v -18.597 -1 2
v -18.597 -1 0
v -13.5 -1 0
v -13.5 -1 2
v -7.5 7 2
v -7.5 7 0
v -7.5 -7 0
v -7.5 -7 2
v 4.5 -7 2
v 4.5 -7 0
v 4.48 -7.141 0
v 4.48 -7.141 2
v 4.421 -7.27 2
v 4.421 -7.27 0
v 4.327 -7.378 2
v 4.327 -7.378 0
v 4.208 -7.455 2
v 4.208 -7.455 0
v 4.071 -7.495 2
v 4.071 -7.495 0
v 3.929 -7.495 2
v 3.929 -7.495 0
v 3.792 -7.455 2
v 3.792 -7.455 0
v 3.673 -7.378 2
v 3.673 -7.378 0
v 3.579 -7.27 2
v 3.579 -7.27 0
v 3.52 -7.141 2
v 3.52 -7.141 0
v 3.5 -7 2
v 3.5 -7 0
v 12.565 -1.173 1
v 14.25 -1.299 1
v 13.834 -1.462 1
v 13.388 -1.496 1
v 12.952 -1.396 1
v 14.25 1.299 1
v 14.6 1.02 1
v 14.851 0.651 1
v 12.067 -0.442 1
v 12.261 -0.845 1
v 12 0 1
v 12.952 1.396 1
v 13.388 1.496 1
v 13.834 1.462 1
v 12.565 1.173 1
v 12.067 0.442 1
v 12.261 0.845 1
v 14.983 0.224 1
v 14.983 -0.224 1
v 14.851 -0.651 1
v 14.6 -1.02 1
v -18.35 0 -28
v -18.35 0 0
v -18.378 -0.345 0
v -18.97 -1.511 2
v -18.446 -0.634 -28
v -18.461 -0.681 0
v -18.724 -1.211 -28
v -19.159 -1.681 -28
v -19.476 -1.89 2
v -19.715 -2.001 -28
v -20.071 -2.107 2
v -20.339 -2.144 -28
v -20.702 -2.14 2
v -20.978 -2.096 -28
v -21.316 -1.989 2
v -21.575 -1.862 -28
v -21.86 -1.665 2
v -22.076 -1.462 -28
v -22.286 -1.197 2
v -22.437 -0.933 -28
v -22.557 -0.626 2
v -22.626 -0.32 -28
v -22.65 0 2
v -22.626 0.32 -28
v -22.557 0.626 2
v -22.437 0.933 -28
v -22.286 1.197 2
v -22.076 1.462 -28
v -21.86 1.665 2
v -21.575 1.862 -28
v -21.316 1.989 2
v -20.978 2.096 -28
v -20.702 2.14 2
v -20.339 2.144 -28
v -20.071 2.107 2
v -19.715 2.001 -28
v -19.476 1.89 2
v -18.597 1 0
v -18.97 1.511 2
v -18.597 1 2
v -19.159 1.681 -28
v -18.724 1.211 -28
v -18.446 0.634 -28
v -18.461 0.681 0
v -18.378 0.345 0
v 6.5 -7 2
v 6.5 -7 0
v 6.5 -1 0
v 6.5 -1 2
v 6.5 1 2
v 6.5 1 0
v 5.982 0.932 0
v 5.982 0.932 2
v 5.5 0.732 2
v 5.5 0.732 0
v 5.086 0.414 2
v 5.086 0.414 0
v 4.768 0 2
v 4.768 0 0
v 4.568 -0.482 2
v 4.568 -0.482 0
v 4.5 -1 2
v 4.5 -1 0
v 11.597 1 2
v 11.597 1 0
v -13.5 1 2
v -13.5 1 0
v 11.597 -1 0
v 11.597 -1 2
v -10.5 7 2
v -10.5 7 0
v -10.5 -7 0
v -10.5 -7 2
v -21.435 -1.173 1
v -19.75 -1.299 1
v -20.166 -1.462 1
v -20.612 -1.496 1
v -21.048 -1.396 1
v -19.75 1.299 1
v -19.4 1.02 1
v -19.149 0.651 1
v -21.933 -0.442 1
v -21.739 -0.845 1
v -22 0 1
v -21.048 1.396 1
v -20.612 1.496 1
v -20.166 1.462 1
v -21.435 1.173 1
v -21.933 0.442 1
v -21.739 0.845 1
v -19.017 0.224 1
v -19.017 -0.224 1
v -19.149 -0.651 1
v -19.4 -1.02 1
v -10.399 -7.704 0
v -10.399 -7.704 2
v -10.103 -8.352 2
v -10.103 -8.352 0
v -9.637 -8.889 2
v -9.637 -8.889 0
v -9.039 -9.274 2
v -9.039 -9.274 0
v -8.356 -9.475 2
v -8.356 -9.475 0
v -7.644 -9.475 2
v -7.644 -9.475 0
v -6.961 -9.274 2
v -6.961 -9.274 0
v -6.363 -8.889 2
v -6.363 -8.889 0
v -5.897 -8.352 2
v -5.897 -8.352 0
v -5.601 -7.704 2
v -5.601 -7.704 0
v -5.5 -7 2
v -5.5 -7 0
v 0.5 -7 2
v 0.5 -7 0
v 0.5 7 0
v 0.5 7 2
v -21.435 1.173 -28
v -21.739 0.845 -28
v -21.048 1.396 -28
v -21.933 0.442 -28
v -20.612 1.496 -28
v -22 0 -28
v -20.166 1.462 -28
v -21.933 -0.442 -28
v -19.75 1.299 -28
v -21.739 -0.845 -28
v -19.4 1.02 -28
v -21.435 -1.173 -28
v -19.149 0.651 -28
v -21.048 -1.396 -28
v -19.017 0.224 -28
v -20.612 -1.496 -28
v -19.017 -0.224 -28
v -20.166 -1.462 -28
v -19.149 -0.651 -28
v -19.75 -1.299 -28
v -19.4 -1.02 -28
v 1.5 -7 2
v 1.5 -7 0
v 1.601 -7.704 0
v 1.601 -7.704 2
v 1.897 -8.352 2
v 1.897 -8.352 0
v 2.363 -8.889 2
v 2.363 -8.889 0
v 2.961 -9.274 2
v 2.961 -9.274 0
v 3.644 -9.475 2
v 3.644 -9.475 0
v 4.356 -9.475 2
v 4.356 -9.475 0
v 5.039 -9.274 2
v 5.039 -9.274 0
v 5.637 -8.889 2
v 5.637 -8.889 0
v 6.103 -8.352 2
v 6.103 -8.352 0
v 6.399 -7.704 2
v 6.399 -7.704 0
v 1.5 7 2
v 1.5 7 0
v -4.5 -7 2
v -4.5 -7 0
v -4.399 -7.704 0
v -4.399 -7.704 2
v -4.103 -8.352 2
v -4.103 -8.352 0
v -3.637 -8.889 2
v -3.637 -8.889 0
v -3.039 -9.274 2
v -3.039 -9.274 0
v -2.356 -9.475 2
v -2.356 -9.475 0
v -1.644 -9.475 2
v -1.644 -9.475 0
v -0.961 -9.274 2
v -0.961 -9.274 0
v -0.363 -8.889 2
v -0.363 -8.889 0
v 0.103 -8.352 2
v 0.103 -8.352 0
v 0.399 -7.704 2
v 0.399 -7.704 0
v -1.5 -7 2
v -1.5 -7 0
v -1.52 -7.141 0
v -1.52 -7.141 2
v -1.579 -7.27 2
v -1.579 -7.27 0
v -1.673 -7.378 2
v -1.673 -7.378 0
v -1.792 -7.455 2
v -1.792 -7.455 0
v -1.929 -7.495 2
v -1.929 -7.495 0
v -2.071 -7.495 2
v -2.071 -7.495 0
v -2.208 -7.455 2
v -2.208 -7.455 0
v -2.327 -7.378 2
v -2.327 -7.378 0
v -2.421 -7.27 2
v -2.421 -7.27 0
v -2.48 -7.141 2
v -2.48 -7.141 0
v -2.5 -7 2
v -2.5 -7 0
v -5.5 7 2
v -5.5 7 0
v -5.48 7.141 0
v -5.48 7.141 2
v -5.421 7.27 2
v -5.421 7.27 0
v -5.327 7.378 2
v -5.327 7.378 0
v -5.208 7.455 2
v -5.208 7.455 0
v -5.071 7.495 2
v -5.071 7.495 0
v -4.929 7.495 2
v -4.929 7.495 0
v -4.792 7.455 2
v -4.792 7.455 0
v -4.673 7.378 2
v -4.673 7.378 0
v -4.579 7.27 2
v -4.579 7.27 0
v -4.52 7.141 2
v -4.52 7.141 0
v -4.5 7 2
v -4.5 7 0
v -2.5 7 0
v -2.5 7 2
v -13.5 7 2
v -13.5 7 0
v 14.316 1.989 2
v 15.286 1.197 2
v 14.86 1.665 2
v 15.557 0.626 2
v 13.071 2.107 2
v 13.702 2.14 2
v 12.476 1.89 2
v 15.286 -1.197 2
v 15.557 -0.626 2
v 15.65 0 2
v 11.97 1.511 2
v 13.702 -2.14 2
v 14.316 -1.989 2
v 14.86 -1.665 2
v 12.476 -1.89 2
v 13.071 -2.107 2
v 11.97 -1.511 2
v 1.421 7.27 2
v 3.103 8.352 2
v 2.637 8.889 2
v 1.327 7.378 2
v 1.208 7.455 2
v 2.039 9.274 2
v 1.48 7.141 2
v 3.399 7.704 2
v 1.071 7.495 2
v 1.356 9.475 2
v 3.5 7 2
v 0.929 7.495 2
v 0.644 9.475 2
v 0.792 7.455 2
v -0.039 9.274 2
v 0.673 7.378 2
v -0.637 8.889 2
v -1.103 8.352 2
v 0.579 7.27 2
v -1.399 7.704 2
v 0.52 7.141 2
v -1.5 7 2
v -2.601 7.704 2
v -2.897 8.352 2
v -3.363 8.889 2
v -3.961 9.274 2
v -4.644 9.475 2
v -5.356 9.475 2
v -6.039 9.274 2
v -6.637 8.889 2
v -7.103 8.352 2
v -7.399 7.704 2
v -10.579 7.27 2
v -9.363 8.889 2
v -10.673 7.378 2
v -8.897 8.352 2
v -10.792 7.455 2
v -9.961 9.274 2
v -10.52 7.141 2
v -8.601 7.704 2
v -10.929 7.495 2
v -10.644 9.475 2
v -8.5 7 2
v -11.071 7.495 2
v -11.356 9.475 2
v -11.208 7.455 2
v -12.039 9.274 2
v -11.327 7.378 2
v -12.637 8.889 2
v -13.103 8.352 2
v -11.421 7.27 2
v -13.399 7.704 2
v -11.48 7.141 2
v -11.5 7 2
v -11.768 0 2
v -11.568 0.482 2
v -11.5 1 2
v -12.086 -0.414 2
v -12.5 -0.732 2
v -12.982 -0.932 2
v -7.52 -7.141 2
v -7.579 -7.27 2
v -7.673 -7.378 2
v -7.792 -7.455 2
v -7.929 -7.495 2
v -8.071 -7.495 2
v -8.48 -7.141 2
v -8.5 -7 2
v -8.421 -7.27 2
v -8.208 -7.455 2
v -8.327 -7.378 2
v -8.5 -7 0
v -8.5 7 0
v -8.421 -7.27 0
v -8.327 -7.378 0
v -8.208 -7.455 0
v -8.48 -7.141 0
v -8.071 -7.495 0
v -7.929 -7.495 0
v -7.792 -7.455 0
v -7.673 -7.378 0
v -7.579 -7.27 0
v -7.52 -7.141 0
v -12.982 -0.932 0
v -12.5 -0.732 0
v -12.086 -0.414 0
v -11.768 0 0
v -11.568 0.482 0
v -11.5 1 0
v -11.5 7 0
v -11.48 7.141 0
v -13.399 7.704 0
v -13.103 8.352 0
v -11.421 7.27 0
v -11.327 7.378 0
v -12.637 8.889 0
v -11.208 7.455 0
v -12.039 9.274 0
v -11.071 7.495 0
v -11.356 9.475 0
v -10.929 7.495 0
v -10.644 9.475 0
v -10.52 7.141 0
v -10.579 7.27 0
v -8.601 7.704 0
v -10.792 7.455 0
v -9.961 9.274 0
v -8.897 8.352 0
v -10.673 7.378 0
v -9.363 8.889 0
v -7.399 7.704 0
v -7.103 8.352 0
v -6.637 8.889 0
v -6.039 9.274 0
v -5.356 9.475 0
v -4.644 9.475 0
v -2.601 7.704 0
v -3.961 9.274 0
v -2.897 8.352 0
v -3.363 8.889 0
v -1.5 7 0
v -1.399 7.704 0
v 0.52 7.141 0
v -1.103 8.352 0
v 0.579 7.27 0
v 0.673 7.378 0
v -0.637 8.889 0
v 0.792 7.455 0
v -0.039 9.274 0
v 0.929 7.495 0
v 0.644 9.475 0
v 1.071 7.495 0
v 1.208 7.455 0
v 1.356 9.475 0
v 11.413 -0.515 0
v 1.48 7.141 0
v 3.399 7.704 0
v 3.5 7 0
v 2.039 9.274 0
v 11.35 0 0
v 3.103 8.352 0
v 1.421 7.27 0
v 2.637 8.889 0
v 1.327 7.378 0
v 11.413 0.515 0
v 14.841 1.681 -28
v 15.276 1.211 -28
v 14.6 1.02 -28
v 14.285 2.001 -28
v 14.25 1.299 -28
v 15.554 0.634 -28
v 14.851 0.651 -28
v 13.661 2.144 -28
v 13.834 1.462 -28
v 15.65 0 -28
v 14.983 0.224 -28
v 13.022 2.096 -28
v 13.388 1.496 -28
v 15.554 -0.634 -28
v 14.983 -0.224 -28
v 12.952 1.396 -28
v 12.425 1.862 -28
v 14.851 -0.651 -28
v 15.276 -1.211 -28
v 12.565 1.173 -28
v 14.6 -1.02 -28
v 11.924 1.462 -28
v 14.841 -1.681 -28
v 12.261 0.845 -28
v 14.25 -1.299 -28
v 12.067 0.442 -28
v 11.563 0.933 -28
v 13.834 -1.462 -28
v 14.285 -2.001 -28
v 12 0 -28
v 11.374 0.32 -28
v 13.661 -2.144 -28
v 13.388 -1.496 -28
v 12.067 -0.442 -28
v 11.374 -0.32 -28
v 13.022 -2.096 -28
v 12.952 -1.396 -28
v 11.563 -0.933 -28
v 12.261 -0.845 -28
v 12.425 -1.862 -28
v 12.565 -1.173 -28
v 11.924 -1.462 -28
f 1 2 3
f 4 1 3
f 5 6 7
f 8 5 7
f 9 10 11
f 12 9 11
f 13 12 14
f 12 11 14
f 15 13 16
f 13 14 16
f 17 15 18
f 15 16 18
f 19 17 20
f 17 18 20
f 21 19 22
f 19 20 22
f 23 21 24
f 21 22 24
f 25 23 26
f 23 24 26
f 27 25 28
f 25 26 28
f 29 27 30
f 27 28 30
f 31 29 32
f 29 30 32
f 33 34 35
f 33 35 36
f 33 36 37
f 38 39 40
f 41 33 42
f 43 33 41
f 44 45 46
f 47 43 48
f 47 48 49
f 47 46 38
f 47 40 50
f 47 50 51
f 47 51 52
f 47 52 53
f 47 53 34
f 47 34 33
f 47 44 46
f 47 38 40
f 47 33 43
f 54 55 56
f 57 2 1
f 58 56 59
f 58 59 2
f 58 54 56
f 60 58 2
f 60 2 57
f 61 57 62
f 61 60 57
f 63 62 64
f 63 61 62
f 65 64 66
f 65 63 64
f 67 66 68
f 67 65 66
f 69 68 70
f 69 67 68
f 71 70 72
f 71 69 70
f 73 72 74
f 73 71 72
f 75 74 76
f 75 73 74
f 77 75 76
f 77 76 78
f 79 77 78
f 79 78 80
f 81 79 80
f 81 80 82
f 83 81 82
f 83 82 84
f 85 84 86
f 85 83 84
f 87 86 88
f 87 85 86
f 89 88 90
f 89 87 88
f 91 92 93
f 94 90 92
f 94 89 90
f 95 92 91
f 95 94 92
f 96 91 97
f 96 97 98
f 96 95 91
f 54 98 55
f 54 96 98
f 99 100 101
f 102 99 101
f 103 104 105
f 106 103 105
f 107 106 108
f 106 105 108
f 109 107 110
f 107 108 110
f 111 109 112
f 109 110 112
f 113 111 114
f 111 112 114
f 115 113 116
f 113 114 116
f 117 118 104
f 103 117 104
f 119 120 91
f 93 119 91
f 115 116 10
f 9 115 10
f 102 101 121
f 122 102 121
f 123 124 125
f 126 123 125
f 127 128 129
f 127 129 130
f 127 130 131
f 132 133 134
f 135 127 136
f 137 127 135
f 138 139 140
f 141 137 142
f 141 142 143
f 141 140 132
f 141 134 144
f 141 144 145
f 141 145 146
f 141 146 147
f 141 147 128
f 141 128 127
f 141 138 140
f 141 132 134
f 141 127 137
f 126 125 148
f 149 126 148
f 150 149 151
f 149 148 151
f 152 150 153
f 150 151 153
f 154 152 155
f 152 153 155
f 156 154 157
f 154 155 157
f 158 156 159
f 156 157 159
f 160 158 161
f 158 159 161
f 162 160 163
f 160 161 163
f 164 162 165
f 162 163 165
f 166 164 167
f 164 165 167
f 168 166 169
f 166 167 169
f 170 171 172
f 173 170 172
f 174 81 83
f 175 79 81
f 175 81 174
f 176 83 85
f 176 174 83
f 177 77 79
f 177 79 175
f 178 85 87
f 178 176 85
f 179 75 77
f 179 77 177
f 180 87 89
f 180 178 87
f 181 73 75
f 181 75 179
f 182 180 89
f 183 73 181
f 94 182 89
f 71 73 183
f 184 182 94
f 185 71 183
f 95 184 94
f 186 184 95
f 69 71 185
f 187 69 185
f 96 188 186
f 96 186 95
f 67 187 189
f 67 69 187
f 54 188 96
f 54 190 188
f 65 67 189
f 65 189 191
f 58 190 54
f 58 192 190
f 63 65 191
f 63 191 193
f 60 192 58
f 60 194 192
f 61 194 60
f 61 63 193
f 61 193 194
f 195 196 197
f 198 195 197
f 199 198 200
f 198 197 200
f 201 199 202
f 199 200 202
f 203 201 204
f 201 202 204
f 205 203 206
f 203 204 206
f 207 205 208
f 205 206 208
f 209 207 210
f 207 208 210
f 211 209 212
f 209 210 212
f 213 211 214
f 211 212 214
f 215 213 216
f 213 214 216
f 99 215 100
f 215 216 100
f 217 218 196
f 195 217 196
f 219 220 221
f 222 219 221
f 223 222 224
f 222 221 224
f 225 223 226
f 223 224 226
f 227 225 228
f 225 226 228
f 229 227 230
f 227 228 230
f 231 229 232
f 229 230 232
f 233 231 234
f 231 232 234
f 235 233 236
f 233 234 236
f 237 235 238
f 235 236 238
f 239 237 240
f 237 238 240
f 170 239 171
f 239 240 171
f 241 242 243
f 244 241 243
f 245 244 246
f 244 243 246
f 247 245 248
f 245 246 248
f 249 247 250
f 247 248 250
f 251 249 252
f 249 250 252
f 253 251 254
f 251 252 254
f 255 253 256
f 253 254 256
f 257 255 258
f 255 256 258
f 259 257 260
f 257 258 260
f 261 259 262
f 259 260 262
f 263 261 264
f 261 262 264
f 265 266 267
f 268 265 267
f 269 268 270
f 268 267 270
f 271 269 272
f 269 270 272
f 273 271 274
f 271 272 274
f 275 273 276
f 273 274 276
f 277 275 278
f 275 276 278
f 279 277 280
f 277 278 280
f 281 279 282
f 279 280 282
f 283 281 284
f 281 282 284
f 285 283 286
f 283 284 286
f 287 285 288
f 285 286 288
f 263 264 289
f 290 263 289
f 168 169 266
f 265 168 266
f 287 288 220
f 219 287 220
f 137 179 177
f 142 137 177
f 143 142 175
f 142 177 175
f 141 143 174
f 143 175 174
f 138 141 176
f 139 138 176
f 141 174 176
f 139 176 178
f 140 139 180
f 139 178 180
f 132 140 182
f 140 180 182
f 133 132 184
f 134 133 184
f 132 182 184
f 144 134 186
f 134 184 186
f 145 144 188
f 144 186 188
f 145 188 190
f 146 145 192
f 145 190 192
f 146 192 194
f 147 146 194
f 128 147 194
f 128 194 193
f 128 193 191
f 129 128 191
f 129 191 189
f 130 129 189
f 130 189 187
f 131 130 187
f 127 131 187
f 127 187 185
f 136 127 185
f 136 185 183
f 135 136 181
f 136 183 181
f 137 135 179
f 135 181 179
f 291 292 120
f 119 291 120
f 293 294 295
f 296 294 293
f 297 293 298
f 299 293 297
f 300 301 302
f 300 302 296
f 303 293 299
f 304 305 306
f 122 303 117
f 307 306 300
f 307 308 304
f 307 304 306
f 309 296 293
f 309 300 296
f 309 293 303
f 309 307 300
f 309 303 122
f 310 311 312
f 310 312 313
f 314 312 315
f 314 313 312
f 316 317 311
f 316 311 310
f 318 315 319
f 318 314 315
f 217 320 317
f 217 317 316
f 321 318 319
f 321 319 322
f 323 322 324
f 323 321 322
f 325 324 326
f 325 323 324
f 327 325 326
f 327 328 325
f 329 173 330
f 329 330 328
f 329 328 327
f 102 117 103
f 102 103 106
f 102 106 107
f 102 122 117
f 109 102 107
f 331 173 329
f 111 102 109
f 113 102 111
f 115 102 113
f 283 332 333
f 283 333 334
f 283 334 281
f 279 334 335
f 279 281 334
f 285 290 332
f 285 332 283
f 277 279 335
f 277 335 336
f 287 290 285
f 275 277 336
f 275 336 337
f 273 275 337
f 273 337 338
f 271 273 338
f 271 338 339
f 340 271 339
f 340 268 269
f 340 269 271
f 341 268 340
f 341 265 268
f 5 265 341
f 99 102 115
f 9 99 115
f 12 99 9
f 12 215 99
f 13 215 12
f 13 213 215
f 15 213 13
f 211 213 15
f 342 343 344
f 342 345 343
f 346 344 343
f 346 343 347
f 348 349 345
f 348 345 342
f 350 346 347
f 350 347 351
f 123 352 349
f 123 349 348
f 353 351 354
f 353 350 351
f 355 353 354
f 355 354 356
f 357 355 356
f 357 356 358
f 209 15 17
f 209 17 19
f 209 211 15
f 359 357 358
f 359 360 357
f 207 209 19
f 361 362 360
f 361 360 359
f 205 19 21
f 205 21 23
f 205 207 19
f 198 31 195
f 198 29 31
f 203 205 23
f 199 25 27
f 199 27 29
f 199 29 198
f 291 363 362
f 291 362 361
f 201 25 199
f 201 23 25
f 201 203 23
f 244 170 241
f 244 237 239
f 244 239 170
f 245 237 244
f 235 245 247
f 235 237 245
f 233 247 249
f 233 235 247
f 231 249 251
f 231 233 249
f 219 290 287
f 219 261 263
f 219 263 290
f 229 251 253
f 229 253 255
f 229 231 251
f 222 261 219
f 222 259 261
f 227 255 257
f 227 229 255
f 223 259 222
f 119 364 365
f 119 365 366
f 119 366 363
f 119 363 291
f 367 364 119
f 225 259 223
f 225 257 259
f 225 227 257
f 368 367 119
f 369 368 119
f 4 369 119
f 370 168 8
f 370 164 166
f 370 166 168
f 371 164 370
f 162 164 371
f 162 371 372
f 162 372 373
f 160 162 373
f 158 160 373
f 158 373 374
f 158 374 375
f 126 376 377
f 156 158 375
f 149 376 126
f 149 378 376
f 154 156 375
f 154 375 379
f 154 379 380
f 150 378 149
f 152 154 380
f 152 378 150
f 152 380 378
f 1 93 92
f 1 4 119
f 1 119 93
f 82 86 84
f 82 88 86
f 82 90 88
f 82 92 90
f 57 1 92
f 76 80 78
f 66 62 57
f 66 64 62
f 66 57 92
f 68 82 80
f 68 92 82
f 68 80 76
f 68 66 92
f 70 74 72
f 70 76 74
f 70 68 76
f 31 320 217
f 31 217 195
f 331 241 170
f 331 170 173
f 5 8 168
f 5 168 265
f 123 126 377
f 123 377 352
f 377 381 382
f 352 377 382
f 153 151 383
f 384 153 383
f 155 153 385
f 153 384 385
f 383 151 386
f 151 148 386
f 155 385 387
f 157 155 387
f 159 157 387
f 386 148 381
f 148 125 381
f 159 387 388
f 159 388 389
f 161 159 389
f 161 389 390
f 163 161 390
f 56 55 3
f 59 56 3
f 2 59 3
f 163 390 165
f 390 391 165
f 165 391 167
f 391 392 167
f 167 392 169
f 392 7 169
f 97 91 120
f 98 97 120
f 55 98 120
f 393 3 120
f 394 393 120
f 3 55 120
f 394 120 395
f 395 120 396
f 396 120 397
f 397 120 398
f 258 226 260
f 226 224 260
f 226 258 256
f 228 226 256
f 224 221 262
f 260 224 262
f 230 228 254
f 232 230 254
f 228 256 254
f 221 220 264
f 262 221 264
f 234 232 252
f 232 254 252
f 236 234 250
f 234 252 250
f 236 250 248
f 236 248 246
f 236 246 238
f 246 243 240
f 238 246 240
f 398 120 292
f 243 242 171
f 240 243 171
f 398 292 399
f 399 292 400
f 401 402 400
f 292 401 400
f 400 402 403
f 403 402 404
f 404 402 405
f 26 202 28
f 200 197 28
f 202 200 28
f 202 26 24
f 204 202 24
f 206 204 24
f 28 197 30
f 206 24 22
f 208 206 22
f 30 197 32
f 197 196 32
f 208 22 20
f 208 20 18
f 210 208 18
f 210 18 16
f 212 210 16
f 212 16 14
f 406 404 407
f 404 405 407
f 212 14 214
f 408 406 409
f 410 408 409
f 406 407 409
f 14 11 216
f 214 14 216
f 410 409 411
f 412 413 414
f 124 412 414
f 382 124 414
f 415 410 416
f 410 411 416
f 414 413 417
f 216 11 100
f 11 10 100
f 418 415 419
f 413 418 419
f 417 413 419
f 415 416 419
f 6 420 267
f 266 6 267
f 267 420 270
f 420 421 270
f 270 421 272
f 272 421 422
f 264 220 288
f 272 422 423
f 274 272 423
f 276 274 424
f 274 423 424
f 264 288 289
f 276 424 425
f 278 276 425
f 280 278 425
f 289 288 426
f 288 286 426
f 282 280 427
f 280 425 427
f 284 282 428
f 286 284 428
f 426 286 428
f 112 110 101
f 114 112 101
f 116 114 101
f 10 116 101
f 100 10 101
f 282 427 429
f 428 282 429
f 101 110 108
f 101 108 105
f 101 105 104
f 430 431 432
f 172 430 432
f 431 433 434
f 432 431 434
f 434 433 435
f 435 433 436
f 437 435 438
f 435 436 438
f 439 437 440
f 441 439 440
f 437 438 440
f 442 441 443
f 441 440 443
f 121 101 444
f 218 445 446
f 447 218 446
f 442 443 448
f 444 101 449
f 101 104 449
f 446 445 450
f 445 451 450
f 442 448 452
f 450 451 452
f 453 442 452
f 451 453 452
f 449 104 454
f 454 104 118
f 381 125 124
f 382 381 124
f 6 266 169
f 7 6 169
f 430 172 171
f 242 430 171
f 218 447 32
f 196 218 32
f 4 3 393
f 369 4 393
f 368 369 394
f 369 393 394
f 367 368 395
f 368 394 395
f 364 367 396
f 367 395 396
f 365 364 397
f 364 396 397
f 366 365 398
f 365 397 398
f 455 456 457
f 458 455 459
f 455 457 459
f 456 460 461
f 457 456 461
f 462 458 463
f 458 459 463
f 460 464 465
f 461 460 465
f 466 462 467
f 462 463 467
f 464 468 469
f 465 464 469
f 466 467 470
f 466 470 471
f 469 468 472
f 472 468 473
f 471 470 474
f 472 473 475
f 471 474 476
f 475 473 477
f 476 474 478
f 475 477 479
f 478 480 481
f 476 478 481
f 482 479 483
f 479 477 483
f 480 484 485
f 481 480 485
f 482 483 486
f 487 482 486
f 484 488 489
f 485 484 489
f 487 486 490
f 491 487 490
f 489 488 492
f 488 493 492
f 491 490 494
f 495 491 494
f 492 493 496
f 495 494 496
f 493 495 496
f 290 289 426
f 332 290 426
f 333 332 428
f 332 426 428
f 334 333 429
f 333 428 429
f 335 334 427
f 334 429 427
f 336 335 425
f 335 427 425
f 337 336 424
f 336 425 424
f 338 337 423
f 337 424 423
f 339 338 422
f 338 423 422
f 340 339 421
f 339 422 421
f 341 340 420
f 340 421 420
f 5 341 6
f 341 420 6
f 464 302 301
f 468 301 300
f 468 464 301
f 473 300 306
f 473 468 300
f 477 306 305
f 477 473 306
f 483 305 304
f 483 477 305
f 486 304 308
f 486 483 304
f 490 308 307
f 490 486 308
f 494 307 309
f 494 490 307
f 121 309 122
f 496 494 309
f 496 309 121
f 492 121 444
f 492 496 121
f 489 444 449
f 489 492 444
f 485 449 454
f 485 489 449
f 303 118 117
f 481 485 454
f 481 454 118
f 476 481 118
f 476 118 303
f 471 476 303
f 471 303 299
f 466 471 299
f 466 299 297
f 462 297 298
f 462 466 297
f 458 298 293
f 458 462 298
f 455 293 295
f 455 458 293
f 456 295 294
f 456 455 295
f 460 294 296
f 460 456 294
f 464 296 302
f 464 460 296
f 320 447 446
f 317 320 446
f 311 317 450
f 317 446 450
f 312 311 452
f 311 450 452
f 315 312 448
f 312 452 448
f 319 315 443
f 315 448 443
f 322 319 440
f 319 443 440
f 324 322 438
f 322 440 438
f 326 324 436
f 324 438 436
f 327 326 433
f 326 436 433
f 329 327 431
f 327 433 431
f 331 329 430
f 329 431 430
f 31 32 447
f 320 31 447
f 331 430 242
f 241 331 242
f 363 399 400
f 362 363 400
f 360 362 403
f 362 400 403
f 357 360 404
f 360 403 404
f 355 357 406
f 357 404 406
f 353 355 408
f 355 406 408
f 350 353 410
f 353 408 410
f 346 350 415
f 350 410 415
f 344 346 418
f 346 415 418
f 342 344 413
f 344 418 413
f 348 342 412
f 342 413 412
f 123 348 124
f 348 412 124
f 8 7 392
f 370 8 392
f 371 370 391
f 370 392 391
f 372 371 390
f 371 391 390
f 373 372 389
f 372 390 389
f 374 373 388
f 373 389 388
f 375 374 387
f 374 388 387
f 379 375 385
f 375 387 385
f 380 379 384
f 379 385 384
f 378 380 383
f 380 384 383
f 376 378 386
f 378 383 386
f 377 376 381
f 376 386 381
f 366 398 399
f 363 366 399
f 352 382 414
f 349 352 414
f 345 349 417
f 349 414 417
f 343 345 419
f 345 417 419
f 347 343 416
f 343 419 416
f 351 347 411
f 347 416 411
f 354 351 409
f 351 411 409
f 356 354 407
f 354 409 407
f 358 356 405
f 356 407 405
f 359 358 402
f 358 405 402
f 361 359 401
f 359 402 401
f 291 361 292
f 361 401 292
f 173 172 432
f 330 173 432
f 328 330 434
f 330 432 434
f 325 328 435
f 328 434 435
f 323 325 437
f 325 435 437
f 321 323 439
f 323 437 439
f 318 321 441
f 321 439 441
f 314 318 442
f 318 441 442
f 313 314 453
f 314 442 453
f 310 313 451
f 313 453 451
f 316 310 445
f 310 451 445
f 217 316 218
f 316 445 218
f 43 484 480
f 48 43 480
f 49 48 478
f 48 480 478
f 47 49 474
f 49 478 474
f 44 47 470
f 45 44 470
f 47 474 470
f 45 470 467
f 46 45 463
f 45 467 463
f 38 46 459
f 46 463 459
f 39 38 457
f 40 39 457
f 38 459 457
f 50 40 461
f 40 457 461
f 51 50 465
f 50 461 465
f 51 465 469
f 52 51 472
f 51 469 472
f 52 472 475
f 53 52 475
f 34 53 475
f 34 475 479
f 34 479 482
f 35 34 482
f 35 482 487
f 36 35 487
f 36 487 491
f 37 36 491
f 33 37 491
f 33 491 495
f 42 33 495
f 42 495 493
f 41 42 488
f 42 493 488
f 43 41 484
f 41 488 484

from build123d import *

# Parameters (mm, degrees)
BOSS_EXTRUDE1_DEPTH = 2
SKETCH3_W           = 2.15
SKETCH3_H           = 30
SKETCH4_W           = 2.15
SKETCH4_H           = 30
SKETCH6_R           = 1.5
CUT_EXTRUDE1_DEPTH  = 29


with BuildPart() as part:
    # Sketch2 → Boss-Extrude1 (new body)
    with BuildSketch(Plane.XY):
        with BuildLine():
            Line((-20.5, -1), (-13.5, -1))
            ThreePointArc((-13.5, -1), (-12.085786438, -0.414213562), (-11.5, 1))
            Line((-11.5, 1), (-11.5, 7))
            ThreePointArc((-11.5, 7), (-11, 7.5), (-10.5, 7))
            Line((-10.5, 7), (-10.5, 0))
            Line((-10.5, 0), (-10.5, -7))
            ThreePointArc((-10.5, -7), (-8, -9.5), (-5.5, -7))
            Line((-5.5, -7), (-5.5, 0))
            Line((-5.5, 0), (-5.5, 7))
            ThreePointArc((-5.5, 7), (-5, 7.5), (-4.5, 7))
            Line((-4.5, 7), (-4.5, 0))
            Line((-4.5, 0), (-4.5, -7))
            ThreePointArc((-4.5, -7), (-2, -9.5), (0.5, -7))
            Line((0.5, -7), (0.5, 0))
            Line((0.5, 0), (0.5, 7))
            ThreePointArc((0.5, 7), (1, 7.5), (1.5, 7))
            Line((1.5, 7), (1.5, 0))
            Line((1.5, 0), (1.5, -7))
            ThreePointArc((1.5, -7), (4, -9.5), (6.5, -7))
            Line((6.5, -7), (6.5, -1))
            Line((6.5, -1), (13.5, -1))
            ThreePointArc((13.5, -1), (14.5, 0), (13.5, 1))
            Line((13.5, 1), (6.5, 1))
            ThreePointArc((6.5, 1), (5.085786438, 0.414213562), (4.5, -1))
            Line((4.5, -1), (4.5, -7))
            ThreePointArc((4.5, -7), (4, -7.5), (3.5, -7))
            Line((3.5, -7), (3.5, 0))
            Line((3.5, 0), (3.5, 7))
            ThreePointArc((3.5, 7), (1, 9.5), (-1.5, 7))
            Line((-1.5, 7), (-1.5, 0))
            Line((-1.5, 0), (-1.5, -7))
            ThreePointArc((-1.5, -7), (-2, -7.5), (-2.5, -7))
            Line((-2.5, -7), (-2.5, 0))
            Line((-2.5, 0), (-2.5, 7))
            ThreePointArc((-2.5, 7), (-5, 9.5), (-7.5, 7))
            Line((-7.5, 7), (-7.5, 0))
            Line((-7.5, 0), (-7.5, -7))
            ThreePointArc((-7.5, -7), (-8, -7.5), (-8.5, -7))
            Line((-8.5, -7), (-8.5, 0))
            Line((-8.5, 0), (-8.5, 7))
            ThreePointArc((-8.5, 7), (-11, 9.5), (-13.5, 7))
            Line((-13.5, 7), (-13.5, 1))
            Line((-13.5, 1), (-20.5, 1))
            ThreePointArc((-20.5, 1), (-21.5, 0), (-20.5, -1))
        make_face()
    extrude(amount=BOSS_EXTRUDE1_DEPTH)

    # Sketch3 → Revolve1 (revolve)
    with BuildSketch(Plane(origin=(0, 0, 0), x_dir=(1, 0, 0), z_dir=(0, 1, 0)), mode=Mode.PRIVATE) as revolve1_sk:
        with Locations((-21.575, 13)):
            Rectangle(SKETCH3_W, SKETCH3_H)
    revolve(revolve1_sk.sketch.rotate(Axis((-20.5, 0, 2), (0, 0, -1)), 180), axis=Axis((-20.5, 0, 2), (0, 0, -1)))

    # Sketch4 → Revolve2 (revolve)
    with BuildSketch(Plane(origin=(0, 0, 0), x_dir=(1, 0, 0), z_dir=(0, 1, 0))):
        with Locations((14.575, 13)):
            Rectangle(SKETCH4_W, SKETCH4_H)
    revolve(axis=Axis((13.5, 0, 2), (0, 0, -1)))

    # Sketch6 → Cut-Extrude1 (cut)
    with BuildSketch(Plane(origin=(0, 0, -28), x_dir=(-1, 0, 0), z_dir=(0, 0, -1))):
        with Locations((-13.5, 0)):
            Circle(SKETCH6_R)
        with Locations((20.5, 0)):
            Circle(SKETCH6_R)
    extrude(amount=-CUT_EXTRUDE1_DEPTH, mode=Mode.SUBTRACT)


solid = part.part
